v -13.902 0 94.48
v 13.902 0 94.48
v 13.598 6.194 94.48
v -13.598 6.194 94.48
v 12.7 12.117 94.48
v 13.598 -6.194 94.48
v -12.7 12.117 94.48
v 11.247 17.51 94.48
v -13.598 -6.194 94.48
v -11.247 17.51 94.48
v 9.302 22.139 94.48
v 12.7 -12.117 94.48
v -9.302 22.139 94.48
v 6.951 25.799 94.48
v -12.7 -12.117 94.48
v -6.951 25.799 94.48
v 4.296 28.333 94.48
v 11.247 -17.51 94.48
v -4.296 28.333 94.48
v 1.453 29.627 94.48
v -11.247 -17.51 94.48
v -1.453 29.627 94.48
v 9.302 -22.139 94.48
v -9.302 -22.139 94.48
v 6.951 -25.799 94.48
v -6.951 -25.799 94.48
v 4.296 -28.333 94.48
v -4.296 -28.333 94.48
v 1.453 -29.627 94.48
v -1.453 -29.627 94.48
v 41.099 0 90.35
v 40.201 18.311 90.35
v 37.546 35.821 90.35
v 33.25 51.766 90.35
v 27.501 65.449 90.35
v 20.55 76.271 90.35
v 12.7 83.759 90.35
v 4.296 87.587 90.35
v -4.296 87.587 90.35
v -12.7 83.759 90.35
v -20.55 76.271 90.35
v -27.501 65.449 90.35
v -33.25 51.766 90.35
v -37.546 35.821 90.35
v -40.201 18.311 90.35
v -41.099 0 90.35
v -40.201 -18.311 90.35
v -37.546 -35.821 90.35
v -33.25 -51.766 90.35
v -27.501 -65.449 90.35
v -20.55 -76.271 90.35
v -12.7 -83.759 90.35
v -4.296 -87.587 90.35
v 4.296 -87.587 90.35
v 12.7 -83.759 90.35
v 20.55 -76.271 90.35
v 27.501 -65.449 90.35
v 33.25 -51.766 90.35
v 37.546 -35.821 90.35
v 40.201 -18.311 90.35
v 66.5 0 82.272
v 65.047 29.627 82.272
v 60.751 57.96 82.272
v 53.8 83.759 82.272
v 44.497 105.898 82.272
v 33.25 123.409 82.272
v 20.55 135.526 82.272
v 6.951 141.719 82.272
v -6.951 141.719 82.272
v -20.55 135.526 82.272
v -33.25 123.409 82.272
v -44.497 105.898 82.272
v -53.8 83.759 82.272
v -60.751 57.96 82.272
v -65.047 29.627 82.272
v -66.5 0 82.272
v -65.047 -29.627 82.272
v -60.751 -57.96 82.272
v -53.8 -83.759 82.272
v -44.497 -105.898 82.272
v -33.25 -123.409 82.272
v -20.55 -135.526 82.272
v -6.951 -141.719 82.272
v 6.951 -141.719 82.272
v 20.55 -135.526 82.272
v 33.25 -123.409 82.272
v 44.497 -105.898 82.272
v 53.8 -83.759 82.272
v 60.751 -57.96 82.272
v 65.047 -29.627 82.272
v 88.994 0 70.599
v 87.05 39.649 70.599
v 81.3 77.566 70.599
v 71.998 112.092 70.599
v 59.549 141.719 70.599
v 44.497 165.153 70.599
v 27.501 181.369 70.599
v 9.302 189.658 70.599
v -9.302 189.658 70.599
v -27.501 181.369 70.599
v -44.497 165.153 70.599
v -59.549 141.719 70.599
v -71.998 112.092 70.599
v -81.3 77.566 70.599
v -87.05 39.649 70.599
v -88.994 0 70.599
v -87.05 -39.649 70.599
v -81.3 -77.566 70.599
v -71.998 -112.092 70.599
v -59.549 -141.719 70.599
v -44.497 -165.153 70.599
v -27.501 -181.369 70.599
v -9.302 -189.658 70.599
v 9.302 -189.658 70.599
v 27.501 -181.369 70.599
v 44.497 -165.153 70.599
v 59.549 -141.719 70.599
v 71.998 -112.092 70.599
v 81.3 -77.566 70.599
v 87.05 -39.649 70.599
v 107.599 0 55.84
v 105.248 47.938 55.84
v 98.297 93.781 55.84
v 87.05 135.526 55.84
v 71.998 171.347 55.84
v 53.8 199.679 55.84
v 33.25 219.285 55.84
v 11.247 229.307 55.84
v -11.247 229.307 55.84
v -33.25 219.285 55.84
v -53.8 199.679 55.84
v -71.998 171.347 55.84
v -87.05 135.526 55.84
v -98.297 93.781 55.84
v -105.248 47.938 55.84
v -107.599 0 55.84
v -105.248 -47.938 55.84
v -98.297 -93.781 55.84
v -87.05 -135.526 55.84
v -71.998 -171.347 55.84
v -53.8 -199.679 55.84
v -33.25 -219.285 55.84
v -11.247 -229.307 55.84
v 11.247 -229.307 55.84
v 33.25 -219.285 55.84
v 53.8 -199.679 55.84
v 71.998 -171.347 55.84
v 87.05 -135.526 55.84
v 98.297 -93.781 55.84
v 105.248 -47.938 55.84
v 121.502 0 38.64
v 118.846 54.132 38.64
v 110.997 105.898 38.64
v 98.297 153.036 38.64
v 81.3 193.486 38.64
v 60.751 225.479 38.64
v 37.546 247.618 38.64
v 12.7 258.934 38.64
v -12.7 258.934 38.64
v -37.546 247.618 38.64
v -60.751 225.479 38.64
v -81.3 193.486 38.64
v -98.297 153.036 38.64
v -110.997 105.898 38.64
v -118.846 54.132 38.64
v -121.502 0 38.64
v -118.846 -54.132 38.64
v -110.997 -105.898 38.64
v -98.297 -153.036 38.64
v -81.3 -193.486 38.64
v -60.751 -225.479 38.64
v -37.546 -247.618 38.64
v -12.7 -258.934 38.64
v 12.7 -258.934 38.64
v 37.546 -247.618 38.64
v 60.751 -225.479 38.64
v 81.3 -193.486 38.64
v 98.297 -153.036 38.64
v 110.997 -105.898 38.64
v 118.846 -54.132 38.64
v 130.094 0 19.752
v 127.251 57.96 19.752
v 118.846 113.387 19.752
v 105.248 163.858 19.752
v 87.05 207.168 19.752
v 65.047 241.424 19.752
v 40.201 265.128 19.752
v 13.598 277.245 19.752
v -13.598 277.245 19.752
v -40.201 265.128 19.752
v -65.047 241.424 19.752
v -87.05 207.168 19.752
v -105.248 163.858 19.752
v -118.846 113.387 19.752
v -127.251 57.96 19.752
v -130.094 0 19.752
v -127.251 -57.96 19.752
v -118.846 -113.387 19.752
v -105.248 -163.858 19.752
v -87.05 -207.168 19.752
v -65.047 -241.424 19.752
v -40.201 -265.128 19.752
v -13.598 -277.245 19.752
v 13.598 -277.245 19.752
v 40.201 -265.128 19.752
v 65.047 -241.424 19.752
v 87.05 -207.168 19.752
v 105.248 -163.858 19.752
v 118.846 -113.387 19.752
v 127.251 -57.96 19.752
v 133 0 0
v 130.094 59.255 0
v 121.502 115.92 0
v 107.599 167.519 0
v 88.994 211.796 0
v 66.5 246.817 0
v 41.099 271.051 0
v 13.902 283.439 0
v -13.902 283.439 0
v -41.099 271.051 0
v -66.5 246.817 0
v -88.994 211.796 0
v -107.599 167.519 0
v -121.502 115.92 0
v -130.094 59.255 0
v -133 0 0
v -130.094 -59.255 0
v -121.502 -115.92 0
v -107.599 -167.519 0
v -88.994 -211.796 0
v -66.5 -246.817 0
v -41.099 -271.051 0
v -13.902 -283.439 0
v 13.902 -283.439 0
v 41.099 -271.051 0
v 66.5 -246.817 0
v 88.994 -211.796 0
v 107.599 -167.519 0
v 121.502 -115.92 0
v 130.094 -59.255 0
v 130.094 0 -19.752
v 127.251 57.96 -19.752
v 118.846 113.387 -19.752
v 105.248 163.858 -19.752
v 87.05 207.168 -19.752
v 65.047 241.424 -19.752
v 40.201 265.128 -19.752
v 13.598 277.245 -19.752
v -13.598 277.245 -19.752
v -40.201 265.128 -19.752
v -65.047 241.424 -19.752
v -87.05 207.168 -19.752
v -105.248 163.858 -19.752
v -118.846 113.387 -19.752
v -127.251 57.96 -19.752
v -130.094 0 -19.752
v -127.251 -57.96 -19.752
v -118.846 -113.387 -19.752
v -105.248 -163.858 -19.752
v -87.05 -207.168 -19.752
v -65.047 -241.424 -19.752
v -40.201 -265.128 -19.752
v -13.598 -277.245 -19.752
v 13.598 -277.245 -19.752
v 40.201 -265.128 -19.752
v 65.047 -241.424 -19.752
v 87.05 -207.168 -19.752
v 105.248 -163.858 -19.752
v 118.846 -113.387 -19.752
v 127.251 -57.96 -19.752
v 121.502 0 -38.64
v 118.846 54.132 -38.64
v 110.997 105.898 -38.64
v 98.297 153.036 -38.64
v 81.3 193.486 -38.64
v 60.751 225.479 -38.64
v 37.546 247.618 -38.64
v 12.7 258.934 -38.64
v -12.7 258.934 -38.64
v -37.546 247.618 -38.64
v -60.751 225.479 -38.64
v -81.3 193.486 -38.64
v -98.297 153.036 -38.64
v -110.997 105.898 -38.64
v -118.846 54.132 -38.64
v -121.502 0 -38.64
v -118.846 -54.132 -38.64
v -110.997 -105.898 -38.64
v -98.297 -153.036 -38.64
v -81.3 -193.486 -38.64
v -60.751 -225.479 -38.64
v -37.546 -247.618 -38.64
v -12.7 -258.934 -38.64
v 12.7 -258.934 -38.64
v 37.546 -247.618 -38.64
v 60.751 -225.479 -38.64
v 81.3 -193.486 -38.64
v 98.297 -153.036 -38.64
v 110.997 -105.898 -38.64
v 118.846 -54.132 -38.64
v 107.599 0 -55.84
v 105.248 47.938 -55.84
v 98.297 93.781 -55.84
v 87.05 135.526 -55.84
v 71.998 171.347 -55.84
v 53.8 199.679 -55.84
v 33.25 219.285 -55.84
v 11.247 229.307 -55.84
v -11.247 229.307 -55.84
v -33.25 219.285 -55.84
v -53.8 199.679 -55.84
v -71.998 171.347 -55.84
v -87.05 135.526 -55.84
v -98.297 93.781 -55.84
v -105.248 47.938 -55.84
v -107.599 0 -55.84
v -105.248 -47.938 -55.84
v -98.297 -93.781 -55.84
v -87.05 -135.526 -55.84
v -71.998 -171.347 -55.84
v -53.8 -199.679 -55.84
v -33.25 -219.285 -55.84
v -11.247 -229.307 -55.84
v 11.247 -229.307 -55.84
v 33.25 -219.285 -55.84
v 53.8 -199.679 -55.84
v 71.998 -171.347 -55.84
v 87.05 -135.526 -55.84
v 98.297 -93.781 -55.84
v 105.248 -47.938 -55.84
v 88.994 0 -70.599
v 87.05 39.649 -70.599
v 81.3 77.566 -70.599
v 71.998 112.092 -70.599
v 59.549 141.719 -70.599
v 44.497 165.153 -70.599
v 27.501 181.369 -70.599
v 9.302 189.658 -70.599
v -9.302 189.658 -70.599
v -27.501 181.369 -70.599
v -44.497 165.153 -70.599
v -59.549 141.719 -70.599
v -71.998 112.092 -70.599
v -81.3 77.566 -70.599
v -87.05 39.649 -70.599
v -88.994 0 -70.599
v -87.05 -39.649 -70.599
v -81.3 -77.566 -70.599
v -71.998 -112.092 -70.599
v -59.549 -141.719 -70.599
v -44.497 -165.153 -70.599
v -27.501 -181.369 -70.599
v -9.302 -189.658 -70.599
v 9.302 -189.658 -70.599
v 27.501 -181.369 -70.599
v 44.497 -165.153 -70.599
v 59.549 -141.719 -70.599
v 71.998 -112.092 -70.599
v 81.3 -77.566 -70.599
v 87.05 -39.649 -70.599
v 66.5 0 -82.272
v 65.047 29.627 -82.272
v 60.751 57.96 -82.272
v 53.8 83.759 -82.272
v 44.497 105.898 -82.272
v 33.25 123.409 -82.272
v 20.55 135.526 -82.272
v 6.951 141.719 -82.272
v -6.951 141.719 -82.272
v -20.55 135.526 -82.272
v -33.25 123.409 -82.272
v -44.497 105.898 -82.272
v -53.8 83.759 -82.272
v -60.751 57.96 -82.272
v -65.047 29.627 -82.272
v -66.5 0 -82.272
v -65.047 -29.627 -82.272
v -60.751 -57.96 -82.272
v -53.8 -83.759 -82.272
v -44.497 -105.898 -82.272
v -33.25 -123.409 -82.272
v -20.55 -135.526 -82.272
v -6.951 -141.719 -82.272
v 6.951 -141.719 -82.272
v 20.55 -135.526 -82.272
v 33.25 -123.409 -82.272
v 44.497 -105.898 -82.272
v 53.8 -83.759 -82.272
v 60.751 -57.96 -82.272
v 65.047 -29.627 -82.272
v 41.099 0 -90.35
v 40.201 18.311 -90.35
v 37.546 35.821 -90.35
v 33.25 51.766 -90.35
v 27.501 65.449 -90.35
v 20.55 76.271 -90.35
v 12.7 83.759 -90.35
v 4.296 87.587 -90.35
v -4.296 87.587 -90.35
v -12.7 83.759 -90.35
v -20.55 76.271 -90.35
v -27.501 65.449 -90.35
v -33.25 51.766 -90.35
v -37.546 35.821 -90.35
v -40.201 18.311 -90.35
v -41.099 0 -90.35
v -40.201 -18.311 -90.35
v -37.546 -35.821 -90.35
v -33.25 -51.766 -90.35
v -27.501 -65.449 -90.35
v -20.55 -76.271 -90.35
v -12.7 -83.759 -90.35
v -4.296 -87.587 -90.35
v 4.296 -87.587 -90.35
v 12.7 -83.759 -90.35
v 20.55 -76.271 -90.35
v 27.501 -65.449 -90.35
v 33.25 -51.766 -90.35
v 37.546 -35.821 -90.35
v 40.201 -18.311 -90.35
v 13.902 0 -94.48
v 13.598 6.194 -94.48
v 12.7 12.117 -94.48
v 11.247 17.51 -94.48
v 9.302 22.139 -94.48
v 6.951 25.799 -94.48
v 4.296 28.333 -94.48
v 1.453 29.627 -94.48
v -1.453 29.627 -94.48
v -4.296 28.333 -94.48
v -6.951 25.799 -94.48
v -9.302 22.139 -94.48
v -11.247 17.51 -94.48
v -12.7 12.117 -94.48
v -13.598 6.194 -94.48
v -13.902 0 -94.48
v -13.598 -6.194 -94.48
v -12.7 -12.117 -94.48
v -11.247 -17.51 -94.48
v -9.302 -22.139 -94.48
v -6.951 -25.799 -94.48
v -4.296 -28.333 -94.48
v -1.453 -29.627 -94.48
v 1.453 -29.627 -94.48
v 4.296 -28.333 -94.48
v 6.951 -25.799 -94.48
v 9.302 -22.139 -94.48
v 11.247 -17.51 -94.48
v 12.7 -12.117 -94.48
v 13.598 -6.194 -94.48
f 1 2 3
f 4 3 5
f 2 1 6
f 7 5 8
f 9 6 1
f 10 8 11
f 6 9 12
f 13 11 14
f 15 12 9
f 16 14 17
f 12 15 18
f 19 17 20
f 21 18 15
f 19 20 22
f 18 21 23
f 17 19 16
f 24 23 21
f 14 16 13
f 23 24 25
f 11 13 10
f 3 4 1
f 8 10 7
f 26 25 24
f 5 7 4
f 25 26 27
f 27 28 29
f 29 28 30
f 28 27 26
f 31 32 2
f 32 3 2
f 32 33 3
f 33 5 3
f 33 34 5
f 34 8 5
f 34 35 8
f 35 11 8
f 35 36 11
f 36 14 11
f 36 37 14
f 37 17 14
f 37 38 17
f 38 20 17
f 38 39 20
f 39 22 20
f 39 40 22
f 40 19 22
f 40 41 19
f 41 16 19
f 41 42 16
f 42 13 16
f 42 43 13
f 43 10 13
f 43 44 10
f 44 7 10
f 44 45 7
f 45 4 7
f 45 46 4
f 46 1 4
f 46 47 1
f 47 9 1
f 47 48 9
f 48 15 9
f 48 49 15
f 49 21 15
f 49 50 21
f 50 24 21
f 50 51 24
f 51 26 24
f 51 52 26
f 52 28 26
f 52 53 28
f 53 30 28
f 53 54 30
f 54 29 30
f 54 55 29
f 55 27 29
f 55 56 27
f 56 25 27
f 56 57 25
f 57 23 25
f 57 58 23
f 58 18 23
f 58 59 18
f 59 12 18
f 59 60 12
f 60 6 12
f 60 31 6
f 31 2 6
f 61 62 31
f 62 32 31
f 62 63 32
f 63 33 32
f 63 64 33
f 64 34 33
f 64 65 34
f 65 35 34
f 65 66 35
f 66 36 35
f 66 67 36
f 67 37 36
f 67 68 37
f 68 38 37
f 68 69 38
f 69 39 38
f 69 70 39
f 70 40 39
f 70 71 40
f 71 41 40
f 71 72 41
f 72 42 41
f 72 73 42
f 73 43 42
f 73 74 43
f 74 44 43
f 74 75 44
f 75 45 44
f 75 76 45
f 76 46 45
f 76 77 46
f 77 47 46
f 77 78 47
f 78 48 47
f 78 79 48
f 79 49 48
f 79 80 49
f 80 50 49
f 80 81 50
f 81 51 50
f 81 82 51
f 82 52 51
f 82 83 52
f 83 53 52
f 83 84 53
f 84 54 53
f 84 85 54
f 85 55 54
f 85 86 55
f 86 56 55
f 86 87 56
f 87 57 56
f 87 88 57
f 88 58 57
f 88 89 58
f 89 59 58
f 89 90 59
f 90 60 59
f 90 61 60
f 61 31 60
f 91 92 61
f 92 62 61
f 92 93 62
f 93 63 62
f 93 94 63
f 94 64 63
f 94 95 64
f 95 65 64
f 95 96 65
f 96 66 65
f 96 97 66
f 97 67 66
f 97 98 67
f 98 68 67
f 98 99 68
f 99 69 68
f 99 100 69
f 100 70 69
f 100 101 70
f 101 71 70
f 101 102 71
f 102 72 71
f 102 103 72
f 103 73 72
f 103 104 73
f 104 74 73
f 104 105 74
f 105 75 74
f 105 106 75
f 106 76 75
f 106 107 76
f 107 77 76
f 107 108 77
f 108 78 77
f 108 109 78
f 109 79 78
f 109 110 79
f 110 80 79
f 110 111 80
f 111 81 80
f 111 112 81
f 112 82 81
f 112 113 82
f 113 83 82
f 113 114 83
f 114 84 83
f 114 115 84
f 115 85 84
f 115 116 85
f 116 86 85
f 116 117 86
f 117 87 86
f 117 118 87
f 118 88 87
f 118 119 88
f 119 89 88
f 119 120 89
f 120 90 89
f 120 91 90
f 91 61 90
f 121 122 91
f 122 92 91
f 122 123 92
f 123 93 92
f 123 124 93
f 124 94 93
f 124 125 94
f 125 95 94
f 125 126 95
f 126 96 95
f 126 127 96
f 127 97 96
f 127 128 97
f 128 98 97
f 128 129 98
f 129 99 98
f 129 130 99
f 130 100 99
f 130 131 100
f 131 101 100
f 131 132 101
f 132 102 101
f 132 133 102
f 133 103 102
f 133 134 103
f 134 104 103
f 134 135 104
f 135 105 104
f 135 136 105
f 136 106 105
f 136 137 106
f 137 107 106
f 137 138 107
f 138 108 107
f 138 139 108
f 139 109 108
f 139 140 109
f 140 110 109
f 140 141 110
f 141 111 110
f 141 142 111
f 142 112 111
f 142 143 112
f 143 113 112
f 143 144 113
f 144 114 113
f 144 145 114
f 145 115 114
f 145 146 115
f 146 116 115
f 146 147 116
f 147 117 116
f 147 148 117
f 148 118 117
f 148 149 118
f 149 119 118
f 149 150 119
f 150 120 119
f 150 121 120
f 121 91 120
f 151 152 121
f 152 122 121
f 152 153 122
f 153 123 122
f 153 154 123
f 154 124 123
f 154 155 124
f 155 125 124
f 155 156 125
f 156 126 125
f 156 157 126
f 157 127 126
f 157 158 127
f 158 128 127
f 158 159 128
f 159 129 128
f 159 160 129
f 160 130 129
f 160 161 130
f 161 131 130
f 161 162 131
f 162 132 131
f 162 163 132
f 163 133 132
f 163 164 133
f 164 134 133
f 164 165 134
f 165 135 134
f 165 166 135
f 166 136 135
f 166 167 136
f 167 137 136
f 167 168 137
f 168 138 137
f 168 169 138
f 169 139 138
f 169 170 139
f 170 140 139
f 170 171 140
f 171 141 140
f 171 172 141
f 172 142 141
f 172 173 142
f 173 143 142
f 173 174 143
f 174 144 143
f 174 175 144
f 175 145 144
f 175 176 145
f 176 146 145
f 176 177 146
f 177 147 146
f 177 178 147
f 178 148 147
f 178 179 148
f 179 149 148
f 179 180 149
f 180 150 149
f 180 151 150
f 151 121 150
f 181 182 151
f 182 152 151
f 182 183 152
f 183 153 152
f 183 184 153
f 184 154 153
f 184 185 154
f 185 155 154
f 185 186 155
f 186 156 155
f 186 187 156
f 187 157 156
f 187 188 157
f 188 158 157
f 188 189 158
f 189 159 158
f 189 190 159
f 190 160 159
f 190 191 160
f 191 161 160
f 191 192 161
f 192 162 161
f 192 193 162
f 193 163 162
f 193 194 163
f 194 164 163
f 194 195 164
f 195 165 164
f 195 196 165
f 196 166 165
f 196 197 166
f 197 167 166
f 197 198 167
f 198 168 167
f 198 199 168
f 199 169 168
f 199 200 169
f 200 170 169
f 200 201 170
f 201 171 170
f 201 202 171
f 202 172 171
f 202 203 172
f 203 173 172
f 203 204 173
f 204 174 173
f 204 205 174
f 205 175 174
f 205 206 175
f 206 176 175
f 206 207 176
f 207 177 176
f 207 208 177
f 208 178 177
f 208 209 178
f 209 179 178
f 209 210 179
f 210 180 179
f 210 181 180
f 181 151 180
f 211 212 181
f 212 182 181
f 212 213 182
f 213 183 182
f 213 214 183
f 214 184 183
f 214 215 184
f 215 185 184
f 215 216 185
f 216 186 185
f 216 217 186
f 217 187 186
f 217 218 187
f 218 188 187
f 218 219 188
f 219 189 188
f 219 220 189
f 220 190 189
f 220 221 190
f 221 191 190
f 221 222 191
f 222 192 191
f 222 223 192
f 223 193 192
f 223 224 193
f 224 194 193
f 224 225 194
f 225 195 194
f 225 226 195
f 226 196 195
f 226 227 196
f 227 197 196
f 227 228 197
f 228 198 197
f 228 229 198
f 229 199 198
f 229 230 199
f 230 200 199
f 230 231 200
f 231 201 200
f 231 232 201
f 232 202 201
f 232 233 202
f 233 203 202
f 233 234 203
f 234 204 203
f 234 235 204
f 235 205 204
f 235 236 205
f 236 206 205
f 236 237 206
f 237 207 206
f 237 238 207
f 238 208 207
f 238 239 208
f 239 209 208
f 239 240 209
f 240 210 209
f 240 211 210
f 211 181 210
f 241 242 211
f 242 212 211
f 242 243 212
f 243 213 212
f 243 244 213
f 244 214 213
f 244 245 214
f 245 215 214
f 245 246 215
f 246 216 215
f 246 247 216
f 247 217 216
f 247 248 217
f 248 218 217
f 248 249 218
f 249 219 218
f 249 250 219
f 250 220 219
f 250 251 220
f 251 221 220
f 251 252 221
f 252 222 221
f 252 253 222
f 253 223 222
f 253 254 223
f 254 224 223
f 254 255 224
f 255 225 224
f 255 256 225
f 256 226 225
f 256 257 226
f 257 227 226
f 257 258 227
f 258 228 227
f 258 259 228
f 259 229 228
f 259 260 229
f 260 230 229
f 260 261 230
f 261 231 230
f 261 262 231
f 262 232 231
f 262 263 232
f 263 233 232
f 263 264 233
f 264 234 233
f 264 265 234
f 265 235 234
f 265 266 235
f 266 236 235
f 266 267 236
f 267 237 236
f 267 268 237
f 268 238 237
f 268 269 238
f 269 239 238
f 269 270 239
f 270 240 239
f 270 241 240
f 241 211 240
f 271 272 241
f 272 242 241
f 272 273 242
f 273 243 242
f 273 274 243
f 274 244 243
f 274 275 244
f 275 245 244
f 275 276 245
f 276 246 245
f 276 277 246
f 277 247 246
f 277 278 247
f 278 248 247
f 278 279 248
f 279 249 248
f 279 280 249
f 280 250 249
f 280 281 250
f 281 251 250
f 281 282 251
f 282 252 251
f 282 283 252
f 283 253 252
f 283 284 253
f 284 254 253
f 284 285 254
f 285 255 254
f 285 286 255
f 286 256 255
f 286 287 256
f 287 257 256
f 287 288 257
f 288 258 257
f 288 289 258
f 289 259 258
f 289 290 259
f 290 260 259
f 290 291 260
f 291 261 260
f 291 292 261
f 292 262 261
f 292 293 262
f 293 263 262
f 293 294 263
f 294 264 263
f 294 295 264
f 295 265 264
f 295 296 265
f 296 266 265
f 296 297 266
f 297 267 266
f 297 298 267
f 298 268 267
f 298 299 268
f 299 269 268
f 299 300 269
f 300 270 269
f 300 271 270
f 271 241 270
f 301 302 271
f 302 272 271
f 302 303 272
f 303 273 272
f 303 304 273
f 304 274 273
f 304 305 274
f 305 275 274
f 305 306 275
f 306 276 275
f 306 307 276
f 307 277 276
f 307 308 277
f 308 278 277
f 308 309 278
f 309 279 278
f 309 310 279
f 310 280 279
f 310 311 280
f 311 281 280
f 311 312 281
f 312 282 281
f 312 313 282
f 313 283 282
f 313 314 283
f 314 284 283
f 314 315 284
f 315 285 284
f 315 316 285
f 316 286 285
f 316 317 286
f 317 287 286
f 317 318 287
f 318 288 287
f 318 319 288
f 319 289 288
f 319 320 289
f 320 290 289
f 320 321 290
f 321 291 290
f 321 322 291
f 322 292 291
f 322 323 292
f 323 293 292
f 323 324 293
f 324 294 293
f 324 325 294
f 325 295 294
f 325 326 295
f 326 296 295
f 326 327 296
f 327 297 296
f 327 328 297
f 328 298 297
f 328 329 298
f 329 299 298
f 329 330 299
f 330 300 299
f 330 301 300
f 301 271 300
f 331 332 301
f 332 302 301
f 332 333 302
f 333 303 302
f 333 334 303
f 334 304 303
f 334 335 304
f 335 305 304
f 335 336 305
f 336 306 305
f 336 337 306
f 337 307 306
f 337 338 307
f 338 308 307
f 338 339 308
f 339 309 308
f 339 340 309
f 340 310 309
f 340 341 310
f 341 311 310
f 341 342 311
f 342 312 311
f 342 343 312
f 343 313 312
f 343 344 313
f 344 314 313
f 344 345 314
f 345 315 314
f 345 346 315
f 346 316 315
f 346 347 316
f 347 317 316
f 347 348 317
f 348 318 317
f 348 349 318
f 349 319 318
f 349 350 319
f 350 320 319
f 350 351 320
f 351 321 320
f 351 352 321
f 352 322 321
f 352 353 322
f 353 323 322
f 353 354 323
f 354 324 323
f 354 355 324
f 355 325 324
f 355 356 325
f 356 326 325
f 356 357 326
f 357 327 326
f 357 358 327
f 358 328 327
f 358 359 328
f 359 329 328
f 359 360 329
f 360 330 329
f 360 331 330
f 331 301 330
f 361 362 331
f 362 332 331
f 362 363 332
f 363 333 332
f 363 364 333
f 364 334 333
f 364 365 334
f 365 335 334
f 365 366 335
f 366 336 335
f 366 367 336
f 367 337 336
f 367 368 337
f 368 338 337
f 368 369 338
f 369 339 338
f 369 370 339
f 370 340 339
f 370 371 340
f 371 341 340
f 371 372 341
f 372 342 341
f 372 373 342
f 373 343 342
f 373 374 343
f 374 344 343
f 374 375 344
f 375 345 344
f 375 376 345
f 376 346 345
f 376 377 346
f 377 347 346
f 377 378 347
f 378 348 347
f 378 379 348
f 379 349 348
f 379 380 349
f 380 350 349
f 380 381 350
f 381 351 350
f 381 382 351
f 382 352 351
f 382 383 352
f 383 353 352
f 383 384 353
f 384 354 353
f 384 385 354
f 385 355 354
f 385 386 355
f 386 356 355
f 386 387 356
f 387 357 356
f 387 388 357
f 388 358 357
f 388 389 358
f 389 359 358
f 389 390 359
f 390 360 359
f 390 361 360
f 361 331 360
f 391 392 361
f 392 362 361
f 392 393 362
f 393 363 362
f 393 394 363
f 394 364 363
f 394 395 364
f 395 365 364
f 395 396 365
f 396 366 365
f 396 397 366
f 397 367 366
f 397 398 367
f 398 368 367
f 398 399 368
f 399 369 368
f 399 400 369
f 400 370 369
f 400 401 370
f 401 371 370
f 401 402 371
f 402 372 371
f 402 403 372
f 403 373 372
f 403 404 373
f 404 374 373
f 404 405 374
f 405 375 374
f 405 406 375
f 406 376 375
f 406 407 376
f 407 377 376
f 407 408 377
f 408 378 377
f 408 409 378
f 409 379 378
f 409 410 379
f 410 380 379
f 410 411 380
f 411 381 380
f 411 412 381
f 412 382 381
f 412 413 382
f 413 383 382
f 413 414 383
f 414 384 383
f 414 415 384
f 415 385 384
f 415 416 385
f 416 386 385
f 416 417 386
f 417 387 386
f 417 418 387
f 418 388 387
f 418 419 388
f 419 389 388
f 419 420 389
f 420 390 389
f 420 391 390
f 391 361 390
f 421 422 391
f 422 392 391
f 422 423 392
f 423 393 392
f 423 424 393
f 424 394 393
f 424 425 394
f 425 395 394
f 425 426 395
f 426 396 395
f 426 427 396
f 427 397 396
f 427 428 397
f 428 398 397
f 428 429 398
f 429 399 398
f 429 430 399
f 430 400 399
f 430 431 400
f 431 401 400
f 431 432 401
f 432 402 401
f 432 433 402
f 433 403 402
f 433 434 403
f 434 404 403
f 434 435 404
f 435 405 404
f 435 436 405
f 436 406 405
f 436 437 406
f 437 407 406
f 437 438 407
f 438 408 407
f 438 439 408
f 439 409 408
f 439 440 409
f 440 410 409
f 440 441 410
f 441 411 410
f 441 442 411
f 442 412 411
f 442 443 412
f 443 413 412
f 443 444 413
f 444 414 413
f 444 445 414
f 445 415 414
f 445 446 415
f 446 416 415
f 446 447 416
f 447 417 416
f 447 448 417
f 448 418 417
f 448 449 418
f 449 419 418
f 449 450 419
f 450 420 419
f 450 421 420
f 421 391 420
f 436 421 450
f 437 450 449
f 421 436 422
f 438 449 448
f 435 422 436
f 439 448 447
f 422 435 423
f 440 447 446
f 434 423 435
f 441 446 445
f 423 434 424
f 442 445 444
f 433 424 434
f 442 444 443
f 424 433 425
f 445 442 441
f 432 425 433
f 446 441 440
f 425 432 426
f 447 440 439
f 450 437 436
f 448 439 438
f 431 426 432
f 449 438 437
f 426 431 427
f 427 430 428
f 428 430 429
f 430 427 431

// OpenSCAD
// Generated by SolidPython 1.0.1 on 2020-07-29 00:46:48


scale(v = [7, 15, 5]) {
	sphere(r = 19);
}
/***********************************************
*********      SolidPython code:      **********
************************************************
 
# import packages: SolidPython
from solid import *
from solid.utils import *
from itertools import chain, combinations, permutations


class Resize:

    def __init__(self, scad_file):
        self.scad_file = scad_file
        #self.scad_file = import_scad(scad_file)
        # cone/cylinder param:
        self.r1 = 0
        self.r2 = 0
        self.h = 0
        # rectangular prism param:
        self.w = 0
        self.l = 0
        # ellipse param:
        self.r = 0

    # import OpenScad code (file name corresponds to shape)


    # classify shape + parameters
    def assign(self, param1, param2, param3):
        if self.scad_file == 'cone.scad':
            self.r1 = param1
            self.r2 = param2
            self.h = param3
        elif self.scad_file == 'cylinder.scad':
            self.r1 = param1
            self.r2 = param2
            self.h = param3
        elif self.scad_file == 'rectangularPrism.scad':
            self.h = param1
            self.l = param2
            self.w = param3
        else:
            self.r = param1
            self.h = param2

    # resize parameters
    def iterate(self):
        x = range(3, 20, 2)
        i = 1
        if self.scad_file == 'cone.scad':
            tempList = list(permutations(x, 2))
            for temp in tempList:
                param1 = temp[0]
                param2 = temp[1]
                filepath = 'produced_scad_files/' + 'cone' + str(param1) + '_' + str(param2) + '_' + '.scad'
                scad_render_to_file(cylinder(h=param1, r1=param2, r2=0), filepath)

        elif self.scad_file == 'cylinder.scad':
            tempList = list(permutations(x, 3))
            for temp in tempList:
                param1 = temp[0]
                param2 = temp[1]
                filepath = 'produced_scad_files/' + 'cylinder' + str(param1) + '_' + str(param2) + '_' + '.scad'
                scad_render_to_file(cylinder(h=param1, r1=param2, r2=param2), filepath)

        elif self.scad_file == 'rectangularPrism.scad':
            tempList = list(permutations(x, 3))
            for temp in tempList:
                param1 = temp[0]
                param2 = temp[1]
                param3 = temp[2]
                filepath = 'produced_scad_files/' + 'rectangularPrism' + str(param1) + '_' + str(param2) + '_' + str(
                    param3) + '.scad'
                scad_render_to_file(cube(size=(param1, param2, param3)), filepath)

        elif self.scad_file == 'ellipse.scad':
            tempList = list(permutations(x, 4))
            for temp in tempList:
                param1 = temp[0]
                param2 = temp[1]
                param3 = temp[2]
                param4 = temp[3]
                filepath = 'produced_scad_files/' + 'ellipse' + str(param1) + '_' + str(param2) + '_' + str(param3) + '_' + str(param4) + '.scad'
                scad_render_to_file(scale([param1, param2, param3])(sphere(r=param4)), filepath)

    def render_to_scadfile(self):
        scad_render_to_file(scad, 'example.scad') 
 
************************************************/
